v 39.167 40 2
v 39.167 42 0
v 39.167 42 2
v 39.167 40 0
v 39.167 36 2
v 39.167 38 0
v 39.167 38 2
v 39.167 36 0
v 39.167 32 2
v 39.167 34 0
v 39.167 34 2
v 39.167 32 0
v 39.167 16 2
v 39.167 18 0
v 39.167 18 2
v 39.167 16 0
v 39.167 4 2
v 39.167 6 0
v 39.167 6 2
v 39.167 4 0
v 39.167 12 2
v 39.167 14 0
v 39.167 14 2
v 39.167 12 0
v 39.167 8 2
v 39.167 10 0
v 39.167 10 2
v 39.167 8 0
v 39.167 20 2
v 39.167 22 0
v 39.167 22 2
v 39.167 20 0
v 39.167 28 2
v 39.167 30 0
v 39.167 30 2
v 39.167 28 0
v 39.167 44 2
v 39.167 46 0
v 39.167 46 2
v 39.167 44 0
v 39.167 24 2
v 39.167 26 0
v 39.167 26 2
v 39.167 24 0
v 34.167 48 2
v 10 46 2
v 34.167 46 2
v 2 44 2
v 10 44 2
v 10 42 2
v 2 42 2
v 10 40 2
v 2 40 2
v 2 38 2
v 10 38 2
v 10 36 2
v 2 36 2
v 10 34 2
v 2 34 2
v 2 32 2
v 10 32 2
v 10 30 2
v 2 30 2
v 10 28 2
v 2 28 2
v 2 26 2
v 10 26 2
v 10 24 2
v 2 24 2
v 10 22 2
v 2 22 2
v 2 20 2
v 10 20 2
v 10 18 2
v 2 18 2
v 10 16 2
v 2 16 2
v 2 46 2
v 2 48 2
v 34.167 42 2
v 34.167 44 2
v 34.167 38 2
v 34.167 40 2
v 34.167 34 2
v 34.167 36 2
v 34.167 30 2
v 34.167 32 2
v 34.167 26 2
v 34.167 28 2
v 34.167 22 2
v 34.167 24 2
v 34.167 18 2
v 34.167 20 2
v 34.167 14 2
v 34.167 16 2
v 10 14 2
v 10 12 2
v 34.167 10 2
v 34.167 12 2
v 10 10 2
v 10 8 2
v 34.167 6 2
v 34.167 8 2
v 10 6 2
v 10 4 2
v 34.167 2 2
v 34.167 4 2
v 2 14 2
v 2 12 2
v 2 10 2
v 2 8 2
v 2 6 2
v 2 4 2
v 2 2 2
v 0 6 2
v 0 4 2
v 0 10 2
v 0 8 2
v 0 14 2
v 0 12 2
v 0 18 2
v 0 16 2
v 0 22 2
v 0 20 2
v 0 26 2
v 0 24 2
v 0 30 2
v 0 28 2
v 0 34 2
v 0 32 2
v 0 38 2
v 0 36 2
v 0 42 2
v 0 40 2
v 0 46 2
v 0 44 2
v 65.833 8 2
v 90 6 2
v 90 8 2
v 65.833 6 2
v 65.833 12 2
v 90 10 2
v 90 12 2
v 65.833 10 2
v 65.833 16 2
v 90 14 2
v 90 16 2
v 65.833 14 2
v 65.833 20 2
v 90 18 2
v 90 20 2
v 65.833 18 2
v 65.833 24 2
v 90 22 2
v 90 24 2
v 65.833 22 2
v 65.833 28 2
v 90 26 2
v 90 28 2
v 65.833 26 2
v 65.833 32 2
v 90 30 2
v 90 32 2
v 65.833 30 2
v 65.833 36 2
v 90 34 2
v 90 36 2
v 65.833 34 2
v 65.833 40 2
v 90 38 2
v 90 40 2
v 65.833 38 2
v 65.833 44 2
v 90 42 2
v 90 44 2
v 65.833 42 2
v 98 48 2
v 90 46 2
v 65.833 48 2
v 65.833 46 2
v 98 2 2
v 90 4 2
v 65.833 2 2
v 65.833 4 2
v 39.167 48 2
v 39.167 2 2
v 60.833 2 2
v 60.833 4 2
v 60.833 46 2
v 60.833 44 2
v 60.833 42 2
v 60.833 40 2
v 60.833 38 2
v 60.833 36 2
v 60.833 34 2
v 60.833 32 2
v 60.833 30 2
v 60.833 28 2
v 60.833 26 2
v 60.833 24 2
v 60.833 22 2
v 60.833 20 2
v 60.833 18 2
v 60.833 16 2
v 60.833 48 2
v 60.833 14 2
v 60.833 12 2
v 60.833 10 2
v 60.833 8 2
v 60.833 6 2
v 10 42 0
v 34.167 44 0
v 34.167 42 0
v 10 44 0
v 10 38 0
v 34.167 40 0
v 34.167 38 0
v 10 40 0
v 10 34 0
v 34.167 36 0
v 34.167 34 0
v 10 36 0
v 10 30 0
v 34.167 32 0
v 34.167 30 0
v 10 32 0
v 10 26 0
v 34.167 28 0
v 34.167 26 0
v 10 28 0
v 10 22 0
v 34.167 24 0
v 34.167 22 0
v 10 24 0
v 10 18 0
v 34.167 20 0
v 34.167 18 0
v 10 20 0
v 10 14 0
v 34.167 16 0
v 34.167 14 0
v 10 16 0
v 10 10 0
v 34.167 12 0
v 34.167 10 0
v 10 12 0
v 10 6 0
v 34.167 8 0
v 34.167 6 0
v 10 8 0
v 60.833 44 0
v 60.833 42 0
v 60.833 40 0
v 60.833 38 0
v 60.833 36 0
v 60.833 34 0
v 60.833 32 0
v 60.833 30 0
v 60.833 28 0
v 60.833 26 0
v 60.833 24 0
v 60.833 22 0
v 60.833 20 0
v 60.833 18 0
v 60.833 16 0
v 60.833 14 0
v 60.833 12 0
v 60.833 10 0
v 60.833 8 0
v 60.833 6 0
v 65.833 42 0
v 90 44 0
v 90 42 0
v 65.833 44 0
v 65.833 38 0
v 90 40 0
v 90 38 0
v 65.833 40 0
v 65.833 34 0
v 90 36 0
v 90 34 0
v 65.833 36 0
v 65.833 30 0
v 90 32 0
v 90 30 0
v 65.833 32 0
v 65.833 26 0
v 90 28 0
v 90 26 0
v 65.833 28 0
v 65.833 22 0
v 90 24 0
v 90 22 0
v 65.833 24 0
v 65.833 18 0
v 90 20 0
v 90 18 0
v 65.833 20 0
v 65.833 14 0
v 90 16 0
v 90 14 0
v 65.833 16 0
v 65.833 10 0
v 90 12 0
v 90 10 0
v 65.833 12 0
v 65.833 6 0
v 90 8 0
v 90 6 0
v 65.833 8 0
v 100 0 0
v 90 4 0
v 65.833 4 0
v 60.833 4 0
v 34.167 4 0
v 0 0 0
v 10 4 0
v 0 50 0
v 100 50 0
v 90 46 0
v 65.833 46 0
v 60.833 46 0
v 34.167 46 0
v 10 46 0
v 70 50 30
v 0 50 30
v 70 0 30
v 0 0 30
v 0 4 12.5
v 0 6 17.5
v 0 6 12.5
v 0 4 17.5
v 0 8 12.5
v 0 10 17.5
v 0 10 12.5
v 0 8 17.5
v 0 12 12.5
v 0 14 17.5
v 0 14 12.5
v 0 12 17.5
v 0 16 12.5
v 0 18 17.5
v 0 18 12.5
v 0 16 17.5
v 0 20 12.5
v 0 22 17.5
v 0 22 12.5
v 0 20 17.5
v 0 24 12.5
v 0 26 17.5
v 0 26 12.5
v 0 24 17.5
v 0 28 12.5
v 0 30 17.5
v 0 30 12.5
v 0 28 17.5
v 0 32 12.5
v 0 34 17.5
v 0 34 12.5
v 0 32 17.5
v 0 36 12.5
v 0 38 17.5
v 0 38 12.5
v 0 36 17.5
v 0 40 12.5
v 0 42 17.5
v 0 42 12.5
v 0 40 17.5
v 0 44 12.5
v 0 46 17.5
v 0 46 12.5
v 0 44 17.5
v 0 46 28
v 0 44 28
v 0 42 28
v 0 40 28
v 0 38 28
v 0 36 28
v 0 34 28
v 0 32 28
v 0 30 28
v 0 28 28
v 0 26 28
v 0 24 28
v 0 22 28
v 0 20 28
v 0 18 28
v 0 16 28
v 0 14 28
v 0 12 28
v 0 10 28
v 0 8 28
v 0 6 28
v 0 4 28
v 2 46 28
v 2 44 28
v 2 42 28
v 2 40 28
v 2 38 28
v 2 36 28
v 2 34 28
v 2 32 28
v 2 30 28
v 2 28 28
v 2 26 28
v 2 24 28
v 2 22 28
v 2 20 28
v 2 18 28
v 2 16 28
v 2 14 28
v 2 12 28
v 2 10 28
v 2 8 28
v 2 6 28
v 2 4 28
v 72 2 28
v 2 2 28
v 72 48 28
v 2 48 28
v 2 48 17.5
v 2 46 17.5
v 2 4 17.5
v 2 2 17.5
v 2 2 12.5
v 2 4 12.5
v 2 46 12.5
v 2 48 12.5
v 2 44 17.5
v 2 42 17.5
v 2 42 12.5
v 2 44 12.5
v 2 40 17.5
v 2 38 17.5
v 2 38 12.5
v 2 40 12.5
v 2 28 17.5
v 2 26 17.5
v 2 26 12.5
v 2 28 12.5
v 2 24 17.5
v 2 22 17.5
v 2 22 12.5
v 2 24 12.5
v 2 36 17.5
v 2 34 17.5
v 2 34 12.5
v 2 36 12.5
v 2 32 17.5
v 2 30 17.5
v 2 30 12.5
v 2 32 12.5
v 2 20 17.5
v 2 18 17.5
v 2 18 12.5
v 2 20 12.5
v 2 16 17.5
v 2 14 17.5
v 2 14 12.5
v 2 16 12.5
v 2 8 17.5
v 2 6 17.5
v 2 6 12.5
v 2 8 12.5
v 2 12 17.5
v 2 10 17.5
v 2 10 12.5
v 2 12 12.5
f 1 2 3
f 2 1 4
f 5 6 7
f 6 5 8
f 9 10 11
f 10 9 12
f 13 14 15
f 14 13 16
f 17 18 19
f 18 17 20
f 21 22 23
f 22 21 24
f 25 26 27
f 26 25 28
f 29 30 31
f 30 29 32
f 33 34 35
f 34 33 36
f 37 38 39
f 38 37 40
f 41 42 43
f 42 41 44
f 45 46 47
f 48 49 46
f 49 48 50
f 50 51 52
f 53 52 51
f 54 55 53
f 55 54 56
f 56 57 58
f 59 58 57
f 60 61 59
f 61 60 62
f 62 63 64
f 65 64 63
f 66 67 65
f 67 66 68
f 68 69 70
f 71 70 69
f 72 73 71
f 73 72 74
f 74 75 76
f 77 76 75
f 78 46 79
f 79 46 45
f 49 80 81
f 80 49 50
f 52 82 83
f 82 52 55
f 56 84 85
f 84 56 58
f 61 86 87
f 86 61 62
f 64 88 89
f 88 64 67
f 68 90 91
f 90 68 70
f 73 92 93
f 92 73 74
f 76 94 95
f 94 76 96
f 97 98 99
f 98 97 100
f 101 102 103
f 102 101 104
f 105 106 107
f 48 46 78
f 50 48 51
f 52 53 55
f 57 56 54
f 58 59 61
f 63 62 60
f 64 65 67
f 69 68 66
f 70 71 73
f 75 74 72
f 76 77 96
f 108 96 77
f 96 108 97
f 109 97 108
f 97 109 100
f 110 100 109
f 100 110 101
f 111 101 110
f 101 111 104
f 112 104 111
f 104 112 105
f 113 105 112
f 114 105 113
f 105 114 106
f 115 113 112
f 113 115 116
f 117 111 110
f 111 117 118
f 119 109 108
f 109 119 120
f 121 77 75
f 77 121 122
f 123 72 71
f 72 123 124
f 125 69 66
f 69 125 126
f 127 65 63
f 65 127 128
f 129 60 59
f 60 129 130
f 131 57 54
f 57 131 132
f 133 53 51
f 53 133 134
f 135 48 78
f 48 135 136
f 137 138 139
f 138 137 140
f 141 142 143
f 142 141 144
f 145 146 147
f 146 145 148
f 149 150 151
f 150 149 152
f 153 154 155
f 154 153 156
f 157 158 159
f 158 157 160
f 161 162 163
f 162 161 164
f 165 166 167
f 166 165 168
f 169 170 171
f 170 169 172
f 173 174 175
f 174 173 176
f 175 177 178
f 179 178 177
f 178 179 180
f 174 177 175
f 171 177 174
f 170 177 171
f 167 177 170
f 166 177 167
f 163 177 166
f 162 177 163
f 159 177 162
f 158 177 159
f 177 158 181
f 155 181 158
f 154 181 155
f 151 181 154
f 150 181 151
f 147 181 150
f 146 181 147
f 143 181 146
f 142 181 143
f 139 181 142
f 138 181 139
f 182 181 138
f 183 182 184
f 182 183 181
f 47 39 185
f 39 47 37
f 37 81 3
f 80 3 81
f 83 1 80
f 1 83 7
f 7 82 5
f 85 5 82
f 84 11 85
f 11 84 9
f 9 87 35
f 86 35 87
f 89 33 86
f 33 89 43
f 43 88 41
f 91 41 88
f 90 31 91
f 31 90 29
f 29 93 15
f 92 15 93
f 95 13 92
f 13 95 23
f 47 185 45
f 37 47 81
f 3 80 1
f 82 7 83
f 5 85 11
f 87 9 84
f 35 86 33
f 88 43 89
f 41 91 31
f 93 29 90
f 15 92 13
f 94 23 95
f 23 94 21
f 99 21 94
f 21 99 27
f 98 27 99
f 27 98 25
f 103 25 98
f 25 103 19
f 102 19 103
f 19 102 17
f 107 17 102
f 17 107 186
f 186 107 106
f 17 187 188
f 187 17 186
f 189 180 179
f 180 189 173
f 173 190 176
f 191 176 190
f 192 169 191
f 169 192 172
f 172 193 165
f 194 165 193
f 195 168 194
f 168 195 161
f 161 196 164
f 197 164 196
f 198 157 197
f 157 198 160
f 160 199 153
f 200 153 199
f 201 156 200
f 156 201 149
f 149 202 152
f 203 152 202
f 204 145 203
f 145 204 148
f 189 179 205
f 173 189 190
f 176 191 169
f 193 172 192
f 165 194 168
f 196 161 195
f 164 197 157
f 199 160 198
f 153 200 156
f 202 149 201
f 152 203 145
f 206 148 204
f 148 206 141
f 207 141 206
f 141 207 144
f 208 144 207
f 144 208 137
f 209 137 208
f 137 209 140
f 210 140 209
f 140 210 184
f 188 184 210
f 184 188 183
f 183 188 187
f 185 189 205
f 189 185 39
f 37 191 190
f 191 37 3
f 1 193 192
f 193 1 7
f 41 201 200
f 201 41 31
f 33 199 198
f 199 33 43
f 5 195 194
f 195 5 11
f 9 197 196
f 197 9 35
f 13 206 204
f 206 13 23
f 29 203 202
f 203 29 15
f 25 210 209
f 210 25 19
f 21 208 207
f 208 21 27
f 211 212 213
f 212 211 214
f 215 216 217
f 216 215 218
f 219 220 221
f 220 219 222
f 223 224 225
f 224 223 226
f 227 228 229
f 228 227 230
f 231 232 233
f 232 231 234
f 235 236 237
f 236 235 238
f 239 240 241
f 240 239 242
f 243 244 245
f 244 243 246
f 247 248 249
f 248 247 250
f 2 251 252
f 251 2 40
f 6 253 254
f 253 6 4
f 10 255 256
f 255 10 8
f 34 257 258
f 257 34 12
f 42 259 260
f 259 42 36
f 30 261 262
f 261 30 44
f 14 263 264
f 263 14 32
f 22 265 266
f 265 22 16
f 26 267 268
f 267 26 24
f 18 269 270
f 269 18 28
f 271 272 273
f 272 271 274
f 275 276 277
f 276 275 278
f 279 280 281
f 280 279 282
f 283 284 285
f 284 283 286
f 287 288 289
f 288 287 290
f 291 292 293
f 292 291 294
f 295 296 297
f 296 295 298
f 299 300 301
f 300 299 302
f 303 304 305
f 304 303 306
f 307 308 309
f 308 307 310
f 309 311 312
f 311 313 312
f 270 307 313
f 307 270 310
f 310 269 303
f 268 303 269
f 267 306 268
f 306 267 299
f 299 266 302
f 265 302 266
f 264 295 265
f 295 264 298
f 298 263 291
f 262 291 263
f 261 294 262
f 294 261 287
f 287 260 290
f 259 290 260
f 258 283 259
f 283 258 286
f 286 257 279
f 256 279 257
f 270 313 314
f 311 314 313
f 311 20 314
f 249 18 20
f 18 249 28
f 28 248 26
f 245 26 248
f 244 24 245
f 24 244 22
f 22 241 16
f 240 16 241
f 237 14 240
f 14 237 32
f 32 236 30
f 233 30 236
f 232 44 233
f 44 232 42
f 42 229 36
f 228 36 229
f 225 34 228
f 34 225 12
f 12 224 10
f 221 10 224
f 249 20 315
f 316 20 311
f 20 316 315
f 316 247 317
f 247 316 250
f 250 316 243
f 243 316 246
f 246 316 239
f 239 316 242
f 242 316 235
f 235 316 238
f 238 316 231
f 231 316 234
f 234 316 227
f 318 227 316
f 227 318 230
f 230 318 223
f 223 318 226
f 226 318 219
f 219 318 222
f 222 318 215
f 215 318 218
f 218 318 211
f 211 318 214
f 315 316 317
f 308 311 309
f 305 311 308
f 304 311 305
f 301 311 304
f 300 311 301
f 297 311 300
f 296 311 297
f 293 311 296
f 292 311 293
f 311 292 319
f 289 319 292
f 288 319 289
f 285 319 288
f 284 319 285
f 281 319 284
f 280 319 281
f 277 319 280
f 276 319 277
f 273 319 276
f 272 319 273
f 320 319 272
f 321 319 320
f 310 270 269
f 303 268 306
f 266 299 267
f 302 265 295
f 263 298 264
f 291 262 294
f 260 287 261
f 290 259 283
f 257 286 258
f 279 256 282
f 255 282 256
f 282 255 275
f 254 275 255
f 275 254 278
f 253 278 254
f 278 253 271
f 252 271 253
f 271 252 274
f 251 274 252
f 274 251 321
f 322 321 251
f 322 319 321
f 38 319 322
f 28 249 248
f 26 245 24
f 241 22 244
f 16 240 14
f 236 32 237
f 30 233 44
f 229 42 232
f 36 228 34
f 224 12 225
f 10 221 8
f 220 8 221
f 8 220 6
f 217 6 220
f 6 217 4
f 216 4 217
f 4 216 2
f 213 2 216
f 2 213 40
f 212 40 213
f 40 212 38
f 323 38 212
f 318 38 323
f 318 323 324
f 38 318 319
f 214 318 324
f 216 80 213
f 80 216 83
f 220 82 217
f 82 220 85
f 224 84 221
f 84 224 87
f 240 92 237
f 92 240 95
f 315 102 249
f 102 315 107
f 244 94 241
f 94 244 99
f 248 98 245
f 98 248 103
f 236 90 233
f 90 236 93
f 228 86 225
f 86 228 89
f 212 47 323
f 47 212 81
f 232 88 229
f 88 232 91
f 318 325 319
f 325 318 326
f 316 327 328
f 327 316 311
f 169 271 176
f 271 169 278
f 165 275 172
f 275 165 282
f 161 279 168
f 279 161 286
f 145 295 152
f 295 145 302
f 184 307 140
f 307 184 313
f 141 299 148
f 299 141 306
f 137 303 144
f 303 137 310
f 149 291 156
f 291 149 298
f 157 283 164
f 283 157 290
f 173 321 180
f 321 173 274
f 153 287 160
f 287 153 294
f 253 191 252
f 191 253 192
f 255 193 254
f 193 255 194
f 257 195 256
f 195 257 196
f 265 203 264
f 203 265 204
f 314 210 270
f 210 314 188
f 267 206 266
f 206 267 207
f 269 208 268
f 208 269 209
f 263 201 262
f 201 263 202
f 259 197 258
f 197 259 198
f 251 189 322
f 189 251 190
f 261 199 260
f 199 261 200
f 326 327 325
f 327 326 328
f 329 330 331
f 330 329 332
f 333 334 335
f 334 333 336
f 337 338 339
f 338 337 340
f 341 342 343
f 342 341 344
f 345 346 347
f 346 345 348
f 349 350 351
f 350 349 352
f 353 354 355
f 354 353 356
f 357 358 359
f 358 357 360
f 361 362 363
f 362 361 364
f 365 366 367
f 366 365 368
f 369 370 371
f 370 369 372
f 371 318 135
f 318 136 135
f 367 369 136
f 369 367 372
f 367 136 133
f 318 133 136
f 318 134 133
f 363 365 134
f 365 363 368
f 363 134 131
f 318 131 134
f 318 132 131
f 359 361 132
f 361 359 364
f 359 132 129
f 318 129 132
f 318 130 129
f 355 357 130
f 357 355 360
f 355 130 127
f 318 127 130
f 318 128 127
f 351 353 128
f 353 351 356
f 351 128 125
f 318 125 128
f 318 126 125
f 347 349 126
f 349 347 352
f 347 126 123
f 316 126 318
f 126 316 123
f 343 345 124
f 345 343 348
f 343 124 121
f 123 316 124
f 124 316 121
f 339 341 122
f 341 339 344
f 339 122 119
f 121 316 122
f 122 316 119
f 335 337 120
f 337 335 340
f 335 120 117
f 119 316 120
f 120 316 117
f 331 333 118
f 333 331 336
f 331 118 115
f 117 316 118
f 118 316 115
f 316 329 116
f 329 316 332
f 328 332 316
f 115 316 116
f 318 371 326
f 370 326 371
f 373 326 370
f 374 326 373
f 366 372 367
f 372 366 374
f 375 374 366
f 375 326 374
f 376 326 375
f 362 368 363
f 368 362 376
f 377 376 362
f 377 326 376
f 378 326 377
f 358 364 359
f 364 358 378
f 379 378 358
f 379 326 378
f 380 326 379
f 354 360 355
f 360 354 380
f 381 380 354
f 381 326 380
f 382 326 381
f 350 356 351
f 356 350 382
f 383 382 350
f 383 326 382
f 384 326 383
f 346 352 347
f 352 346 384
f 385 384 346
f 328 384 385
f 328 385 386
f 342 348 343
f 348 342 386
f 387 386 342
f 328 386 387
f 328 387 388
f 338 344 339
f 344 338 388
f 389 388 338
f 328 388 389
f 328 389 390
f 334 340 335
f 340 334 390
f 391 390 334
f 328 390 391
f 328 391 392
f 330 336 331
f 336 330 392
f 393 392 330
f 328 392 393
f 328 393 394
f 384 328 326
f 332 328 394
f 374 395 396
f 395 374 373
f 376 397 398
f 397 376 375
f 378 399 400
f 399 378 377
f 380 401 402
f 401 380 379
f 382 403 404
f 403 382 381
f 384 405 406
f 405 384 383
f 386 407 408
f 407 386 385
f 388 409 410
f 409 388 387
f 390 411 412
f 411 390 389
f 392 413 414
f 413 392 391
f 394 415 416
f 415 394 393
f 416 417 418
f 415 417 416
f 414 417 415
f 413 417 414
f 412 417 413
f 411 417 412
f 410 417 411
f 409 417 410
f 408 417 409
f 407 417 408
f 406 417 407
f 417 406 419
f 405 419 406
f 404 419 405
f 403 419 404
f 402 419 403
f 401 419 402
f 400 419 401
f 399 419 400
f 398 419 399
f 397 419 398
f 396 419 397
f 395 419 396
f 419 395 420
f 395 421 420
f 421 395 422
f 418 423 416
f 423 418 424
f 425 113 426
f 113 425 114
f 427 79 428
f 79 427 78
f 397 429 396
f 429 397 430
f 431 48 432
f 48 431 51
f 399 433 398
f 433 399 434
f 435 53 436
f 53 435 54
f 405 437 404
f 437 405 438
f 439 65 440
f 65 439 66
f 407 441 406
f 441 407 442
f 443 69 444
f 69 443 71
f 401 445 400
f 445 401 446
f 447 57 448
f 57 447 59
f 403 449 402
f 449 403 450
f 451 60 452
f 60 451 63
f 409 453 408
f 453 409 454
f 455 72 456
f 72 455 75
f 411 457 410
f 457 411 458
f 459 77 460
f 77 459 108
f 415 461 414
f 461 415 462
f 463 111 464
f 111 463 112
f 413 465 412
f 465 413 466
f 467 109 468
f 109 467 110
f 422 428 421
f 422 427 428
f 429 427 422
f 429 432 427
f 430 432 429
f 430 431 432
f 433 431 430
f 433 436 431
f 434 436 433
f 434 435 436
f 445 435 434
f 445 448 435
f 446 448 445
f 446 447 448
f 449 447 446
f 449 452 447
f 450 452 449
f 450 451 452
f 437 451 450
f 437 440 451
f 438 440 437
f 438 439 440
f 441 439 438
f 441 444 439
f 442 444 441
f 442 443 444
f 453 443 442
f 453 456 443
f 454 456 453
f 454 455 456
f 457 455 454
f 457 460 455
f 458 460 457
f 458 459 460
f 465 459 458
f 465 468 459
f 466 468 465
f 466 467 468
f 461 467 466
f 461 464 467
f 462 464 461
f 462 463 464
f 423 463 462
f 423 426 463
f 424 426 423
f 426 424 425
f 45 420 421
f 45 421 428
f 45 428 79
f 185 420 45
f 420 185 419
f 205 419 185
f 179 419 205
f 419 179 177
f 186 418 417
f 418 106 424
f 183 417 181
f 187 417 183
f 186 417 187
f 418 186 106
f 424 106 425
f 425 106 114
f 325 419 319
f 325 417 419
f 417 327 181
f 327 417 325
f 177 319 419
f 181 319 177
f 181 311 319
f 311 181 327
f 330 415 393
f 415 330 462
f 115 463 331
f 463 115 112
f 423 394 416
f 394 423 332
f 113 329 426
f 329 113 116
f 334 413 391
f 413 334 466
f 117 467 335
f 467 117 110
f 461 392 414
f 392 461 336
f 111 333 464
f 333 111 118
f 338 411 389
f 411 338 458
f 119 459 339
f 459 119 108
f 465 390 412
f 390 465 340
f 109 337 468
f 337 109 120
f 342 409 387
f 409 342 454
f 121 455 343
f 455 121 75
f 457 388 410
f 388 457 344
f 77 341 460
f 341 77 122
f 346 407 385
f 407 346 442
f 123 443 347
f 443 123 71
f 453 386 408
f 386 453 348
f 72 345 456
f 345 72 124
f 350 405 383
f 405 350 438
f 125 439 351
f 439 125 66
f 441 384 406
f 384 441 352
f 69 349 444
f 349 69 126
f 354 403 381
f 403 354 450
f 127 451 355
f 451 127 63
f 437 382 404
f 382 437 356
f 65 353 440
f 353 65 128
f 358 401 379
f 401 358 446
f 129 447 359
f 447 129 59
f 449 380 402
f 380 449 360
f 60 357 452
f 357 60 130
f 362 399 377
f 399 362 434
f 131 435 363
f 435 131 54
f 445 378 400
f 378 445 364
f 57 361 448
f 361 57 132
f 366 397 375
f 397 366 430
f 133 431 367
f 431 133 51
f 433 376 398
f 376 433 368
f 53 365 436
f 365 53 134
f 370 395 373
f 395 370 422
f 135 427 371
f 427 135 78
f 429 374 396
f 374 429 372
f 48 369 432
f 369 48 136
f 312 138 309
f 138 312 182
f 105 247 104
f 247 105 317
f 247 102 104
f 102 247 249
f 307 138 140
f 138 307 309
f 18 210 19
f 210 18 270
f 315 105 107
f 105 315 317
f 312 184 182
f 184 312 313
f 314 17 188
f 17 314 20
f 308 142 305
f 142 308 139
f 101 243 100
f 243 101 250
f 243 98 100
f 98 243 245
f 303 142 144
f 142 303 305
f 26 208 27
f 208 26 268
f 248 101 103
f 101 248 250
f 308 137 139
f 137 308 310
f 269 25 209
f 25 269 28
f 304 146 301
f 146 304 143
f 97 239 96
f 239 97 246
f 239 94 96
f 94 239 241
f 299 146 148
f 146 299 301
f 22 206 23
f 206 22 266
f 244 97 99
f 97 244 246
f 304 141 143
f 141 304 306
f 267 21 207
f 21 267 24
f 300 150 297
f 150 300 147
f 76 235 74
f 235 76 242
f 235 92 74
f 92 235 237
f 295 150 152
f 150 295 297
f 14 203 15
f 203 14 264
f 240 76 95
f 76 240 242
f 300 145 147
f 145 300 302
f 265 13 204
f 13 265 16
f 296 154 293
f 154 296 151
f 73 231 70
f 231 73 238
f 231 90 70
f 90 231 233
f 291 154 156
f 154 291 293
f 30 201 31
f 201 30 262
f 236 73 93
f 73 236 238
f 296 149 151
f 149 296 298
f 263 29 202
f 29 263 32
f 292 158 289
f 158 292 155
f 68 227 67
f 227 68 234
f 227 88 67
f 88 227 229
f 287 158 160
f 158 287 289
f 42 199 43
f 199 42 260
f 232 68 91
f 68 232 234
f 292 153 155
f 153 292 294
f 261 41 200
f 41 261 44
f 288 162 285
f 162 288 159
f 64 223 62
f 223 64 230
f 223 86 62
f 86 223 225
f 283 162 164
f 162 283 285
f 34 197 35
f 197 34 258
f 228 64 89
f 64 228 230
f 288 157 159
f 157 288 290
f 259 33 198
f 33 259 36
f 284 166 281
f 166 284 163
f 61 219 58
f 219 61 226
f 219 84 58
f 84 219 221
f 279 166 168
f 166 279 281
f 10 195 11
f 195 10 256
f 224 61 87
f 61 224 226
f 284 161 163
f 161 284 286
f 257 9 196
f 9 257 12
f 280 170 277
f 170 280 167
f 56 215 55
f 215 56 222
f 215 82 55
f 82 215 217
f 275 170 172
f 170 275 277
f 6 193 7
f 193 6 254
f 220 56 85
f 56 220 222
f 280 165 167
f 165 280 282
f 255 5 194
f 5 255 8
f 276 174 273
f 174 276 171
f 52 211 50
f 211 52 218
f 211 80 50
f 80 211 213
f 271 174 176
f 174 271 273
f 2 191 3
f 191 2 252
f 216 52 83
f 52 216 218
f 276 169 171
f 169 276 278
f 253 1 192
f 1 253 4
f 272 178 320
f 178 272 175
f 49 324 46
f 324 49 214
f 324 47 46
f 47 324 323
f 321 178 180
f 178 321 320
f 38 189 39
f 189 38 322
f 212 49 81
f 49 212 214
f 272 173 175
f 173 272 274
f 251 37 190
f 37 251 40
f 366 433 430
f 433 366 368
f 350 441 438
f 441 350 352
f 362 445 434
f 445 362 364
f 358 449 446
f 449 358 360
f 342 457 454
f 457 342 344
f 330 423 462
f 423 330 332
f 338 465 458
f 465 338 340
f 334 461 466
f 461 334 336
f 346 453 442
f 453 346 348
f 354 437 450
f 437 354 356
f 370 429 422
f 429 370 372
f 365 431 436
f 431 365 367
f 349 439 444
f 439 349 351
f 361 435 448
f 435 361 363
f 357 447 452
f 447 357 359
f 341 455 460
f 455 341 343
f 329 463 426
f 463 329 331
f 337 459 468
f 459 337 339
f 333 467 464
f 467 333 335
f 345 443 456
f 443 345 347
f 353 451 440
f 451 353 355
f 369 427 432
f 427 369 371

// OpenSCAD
length=100;
width=50;
height=30;
angle=45;
thickness=2;
slotWidth=2;
nrStabilizerBottom=2;
nrStabilizerBack=1;

module box(){
difference(){
cube([length,width,height]);
translate([thickness,thickness,thickness]){
cube([length,width-2*thickness,height-2*thickness]);}
translate([length,0,0]){
rotate(-angle,[0,1,0]){
cube([length,width,1000]);}}}}



//bottom stabilizers
for (x=[1:nrStabilizerBottom]){
translate([10-2.5+(length-20)/(1+nrStabilizerBottom)*x,0,0]){
cube([5,width,thickness]);}}

//back stabilizers
for (x=[1:nrStabilizerBack]){
translate([0,0,height/(nrStabilizerBack+1)*x-2.5]){
cube([thickness,width,5]);}}

difference(){
box();
    
//bottom slots
for (i=[1:(width-2*thickness)/(slotWidth*2)]){
translate([0,i*slotWidth*2,thickness]){
cube([thickness,slotWidth,height-2*thickness]);}}
//back slots
translate([10,0,-1]){
for (i=[1:(width-2*thickness)/(slotWidth*2)]){
translate([0,i*slotWidth*2,0]){    
cube([length-20,slotWidth,thickness+2]);}
}}}
